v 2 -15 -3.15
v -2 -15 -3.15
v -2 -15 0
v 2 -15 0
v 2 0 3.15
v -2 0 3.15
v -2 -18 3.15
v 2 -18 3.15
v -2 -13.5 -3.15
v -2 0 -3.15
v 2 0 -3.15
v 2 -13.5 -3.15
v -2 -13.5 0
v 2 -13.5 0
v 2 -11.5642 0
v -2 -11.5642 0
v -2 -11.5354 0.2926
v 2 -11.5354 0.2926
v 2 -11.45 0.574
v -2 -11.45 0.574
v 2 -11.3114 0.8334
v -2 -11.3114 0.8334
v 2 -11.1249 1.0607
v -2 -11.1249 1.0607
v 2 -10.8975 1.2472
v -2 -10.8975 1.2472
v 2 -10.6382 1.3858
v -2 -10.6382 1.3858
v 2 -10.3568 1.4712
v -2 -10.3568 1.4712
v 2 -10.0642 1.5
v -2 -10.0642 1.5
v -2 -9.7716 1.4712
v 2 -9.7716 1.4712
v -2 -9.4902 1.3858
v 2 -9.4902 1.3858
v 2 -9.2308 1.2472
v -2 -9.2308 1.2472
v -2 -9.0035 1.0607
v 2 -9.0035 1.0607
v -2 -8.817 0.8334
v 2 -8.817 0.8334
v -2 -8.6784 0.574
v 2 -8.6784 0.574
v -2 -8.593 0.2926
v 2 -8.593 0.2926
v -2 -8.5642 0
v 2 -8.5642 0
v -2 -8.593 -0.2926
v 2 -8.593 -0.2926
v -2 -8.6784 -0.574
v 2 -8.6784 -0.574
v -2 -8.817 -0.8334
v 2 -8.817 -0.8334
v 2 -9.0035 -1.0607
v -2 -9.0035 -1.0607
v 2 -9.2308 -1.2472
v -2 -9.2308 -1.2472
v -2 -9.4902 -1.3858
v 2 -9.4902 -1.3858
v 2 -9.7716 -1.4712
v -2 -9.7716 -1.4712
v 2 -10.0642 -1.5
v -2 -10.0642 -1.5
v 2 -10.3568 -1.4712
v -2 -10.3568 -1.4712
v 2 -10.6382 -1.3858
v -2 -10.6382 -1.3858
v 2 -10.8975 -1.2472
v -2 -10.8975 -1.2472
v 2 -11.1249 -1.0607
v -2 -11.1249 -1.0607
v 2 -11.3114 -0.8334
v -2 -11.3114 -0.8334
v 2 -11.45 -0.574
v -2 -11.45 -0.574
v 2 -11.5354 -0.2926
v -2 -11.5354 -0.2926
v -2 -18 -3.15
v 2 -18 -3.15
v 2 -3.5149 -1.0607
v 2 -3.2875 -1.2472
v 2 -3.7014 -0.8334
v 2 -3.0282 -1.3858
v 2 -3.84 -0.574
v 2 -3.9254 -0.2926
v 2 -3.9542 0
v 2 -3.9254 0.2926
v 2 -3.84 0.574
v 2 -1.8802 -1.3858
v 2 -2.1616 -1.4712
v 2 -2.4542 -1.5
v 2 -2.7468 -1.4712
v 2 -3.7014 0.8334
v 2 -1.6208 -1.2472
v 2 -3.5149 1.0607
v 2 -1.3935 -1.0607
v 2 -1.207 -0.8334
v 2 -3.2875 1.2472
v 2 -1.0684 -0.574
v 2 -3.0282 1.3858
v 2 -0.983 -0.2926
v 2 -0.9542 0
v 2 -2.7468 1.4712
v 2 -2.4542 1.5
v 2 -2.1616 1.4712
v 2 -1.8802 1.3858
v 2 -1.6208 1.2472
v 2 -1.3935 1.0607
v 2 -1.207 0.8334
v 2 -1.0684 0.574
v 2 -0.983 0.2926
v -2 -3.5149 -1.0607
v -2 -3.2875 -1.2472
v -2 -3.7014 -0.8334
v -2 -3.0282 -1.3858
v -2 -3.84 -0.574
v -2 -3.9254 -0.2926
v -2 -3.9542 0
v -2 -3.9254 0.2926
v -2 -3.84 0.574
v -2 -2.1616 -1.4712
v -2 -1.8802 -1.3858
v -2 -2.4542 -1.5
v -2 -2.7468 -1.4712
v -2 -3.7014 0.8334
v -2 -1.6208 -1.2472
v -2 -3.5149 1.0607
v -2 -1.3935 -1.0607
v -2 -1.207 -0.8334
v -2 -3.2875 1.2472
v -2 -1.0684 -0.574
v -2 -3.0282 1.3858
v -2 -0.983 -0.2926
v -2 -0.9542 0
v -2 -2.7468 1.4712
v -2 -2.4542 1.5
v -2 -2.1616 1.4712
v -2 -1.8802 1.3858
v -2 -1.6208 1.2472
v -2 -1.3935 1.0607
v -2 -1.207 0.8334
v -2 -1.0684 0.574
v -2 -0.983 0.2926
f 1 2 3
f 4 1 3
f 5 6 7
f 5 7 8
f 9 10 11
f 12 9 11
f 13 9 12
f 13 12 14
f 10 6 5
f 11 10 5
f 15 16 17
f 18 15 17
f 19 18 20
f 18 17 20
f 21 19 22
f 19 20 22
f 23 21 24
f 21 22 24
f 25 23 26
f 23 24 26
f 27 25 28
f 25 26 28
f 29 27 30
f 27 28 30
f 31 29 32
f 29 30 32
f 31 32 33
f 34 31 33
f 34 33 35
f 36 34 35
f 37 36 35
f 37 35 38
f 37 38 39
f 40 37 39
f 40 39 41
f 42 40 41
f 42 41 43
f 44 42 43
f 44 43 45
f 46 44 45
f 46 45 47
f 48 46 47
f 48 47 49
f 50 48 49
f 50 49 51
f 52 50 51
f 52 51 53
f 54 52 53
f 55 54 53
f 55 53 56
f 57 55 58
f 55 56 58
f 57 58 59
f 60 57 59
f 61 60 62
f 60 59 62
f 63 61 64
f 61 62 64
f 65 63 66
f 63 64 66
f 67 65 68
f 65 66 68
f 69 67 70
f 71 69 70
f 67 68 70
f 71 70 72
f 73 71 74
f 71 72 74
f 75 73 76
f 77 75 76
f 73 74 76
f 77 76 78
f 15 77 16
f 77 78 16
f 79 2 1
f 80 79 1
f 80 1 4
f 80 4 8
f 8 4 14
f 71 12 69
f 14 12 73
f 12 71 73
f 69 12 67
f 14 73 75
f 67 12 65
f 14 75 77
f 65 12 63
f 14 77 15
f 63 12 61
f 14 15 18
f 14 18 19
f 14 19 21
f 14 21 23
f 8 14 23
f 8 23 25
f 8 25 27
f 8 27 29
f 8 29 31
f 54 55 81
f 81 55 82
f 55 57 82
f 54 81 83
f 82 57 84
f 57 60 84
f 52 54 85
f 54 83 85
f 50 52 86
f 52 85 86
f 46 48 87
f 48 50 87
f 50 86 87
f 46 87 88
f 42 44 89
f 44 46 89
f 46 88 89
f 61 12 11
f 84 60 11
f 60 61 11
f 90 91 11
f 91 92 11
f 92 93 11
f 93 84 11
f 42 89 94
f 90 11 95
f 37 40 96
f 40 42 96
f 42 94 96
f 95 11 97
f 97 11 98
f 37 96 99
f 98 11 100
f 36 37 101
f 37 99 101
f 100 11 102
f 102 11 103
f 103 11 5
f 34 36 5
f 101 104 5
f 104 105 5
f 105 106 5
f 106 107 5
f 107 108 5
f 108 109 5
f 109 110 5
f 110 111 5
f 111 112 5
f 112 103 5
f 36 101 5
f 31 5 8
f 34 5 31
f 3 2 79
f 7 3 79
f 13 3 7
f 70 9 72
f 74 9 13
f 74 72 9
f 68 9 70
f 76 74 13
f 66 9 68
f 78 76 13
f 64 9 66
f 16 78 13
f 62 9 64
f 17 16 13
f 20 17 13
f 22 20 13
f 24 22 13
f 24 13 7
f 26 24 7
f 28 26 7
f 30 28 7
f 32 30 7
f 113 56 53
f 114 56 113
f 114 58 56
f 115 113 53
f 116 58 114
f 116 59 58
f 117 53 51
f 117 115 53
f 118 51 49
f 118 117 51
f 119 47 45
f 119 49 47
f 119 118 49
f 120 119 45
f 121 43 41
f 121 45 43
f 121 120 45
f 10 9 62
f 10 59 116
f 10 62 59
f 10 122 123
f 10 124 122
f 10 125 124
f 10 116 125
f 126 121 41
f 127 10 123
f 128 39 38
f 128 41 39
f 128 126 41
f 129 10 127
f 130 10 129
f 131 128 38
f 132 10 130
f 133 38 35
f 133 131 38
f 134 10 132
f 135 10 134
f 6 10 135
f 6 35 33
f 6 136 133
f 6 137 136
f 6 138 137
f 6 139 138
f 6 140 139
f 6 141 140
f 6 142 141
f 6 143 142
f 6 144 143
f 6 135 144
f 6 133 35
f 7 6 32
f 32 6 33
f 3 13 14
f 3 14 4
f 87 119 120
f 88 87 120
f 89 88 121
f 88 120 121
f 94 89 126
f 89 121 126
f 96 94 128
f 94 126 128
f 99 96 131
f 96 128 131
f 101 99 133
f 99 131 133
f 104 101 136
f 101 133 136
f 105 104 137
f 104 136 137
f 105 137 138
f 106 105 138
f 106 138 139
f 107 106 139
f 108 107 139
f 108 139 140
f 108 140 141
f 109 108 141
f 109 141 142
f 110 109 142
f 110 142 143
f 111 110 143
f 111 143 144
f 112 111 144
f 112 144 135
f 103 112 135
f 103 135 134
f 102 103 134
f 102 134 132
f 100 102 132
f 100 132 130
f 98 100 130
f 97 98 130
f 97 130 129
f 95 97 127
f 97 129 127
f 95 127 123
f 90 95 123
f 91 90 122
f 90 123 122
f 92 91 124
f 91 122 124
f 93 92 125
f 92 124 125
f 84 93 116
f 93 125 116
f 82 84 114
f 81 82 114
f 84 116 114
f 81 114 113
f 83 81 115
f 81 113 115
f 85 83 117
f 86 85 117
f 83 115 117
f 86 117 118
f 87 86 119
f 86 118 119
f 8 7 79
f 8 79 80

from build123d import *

# Parameters (mm, degrees)
F0_W     = 4
F0_H     = 6.3
F1_DEPTH = 18
F2_W     = 1.5
F2_H     = 3.15
F3_DEPTH = 25
F4_R     = 1.5
F5_DEPTH = 25


with BuildPart() as f1:
    # F0 (on Front) → F1 (new body)
    with BuildSketch(Plane.XZ):
        Rectangle(F0_W, F0_H)
    extrude(amount=F1_DEPTH)

    # F2 (on face) → F3 (cut)
    with BuildSketch(Plane(origin=(-2, 0, 0), x_dir=(0, -1, 0), z_dir=(-1, 0, 0))):
        with Locations((14.25, -1.575)):
            Rectangle(F2_W, F2_H)
    extrude(amount=-F3_DEPTH, mode=Mode.SUBTRACT)

    # F4 (on face) → F5 (cut)
    with BuildSketch(Plane(origin=(-2, 0, 0), x_dir=(0, -1, 0), z_dir=(-1, 0, 0))):
        with Locations((2.45419, 0)):
            Circle(F4_R)
        with Locations((10.06419, 0)):
            Circle(F4_R)
    extrude(amount=-F5_DEPTH, mode=Mode.SUBTRACT)


solid = f1.part
